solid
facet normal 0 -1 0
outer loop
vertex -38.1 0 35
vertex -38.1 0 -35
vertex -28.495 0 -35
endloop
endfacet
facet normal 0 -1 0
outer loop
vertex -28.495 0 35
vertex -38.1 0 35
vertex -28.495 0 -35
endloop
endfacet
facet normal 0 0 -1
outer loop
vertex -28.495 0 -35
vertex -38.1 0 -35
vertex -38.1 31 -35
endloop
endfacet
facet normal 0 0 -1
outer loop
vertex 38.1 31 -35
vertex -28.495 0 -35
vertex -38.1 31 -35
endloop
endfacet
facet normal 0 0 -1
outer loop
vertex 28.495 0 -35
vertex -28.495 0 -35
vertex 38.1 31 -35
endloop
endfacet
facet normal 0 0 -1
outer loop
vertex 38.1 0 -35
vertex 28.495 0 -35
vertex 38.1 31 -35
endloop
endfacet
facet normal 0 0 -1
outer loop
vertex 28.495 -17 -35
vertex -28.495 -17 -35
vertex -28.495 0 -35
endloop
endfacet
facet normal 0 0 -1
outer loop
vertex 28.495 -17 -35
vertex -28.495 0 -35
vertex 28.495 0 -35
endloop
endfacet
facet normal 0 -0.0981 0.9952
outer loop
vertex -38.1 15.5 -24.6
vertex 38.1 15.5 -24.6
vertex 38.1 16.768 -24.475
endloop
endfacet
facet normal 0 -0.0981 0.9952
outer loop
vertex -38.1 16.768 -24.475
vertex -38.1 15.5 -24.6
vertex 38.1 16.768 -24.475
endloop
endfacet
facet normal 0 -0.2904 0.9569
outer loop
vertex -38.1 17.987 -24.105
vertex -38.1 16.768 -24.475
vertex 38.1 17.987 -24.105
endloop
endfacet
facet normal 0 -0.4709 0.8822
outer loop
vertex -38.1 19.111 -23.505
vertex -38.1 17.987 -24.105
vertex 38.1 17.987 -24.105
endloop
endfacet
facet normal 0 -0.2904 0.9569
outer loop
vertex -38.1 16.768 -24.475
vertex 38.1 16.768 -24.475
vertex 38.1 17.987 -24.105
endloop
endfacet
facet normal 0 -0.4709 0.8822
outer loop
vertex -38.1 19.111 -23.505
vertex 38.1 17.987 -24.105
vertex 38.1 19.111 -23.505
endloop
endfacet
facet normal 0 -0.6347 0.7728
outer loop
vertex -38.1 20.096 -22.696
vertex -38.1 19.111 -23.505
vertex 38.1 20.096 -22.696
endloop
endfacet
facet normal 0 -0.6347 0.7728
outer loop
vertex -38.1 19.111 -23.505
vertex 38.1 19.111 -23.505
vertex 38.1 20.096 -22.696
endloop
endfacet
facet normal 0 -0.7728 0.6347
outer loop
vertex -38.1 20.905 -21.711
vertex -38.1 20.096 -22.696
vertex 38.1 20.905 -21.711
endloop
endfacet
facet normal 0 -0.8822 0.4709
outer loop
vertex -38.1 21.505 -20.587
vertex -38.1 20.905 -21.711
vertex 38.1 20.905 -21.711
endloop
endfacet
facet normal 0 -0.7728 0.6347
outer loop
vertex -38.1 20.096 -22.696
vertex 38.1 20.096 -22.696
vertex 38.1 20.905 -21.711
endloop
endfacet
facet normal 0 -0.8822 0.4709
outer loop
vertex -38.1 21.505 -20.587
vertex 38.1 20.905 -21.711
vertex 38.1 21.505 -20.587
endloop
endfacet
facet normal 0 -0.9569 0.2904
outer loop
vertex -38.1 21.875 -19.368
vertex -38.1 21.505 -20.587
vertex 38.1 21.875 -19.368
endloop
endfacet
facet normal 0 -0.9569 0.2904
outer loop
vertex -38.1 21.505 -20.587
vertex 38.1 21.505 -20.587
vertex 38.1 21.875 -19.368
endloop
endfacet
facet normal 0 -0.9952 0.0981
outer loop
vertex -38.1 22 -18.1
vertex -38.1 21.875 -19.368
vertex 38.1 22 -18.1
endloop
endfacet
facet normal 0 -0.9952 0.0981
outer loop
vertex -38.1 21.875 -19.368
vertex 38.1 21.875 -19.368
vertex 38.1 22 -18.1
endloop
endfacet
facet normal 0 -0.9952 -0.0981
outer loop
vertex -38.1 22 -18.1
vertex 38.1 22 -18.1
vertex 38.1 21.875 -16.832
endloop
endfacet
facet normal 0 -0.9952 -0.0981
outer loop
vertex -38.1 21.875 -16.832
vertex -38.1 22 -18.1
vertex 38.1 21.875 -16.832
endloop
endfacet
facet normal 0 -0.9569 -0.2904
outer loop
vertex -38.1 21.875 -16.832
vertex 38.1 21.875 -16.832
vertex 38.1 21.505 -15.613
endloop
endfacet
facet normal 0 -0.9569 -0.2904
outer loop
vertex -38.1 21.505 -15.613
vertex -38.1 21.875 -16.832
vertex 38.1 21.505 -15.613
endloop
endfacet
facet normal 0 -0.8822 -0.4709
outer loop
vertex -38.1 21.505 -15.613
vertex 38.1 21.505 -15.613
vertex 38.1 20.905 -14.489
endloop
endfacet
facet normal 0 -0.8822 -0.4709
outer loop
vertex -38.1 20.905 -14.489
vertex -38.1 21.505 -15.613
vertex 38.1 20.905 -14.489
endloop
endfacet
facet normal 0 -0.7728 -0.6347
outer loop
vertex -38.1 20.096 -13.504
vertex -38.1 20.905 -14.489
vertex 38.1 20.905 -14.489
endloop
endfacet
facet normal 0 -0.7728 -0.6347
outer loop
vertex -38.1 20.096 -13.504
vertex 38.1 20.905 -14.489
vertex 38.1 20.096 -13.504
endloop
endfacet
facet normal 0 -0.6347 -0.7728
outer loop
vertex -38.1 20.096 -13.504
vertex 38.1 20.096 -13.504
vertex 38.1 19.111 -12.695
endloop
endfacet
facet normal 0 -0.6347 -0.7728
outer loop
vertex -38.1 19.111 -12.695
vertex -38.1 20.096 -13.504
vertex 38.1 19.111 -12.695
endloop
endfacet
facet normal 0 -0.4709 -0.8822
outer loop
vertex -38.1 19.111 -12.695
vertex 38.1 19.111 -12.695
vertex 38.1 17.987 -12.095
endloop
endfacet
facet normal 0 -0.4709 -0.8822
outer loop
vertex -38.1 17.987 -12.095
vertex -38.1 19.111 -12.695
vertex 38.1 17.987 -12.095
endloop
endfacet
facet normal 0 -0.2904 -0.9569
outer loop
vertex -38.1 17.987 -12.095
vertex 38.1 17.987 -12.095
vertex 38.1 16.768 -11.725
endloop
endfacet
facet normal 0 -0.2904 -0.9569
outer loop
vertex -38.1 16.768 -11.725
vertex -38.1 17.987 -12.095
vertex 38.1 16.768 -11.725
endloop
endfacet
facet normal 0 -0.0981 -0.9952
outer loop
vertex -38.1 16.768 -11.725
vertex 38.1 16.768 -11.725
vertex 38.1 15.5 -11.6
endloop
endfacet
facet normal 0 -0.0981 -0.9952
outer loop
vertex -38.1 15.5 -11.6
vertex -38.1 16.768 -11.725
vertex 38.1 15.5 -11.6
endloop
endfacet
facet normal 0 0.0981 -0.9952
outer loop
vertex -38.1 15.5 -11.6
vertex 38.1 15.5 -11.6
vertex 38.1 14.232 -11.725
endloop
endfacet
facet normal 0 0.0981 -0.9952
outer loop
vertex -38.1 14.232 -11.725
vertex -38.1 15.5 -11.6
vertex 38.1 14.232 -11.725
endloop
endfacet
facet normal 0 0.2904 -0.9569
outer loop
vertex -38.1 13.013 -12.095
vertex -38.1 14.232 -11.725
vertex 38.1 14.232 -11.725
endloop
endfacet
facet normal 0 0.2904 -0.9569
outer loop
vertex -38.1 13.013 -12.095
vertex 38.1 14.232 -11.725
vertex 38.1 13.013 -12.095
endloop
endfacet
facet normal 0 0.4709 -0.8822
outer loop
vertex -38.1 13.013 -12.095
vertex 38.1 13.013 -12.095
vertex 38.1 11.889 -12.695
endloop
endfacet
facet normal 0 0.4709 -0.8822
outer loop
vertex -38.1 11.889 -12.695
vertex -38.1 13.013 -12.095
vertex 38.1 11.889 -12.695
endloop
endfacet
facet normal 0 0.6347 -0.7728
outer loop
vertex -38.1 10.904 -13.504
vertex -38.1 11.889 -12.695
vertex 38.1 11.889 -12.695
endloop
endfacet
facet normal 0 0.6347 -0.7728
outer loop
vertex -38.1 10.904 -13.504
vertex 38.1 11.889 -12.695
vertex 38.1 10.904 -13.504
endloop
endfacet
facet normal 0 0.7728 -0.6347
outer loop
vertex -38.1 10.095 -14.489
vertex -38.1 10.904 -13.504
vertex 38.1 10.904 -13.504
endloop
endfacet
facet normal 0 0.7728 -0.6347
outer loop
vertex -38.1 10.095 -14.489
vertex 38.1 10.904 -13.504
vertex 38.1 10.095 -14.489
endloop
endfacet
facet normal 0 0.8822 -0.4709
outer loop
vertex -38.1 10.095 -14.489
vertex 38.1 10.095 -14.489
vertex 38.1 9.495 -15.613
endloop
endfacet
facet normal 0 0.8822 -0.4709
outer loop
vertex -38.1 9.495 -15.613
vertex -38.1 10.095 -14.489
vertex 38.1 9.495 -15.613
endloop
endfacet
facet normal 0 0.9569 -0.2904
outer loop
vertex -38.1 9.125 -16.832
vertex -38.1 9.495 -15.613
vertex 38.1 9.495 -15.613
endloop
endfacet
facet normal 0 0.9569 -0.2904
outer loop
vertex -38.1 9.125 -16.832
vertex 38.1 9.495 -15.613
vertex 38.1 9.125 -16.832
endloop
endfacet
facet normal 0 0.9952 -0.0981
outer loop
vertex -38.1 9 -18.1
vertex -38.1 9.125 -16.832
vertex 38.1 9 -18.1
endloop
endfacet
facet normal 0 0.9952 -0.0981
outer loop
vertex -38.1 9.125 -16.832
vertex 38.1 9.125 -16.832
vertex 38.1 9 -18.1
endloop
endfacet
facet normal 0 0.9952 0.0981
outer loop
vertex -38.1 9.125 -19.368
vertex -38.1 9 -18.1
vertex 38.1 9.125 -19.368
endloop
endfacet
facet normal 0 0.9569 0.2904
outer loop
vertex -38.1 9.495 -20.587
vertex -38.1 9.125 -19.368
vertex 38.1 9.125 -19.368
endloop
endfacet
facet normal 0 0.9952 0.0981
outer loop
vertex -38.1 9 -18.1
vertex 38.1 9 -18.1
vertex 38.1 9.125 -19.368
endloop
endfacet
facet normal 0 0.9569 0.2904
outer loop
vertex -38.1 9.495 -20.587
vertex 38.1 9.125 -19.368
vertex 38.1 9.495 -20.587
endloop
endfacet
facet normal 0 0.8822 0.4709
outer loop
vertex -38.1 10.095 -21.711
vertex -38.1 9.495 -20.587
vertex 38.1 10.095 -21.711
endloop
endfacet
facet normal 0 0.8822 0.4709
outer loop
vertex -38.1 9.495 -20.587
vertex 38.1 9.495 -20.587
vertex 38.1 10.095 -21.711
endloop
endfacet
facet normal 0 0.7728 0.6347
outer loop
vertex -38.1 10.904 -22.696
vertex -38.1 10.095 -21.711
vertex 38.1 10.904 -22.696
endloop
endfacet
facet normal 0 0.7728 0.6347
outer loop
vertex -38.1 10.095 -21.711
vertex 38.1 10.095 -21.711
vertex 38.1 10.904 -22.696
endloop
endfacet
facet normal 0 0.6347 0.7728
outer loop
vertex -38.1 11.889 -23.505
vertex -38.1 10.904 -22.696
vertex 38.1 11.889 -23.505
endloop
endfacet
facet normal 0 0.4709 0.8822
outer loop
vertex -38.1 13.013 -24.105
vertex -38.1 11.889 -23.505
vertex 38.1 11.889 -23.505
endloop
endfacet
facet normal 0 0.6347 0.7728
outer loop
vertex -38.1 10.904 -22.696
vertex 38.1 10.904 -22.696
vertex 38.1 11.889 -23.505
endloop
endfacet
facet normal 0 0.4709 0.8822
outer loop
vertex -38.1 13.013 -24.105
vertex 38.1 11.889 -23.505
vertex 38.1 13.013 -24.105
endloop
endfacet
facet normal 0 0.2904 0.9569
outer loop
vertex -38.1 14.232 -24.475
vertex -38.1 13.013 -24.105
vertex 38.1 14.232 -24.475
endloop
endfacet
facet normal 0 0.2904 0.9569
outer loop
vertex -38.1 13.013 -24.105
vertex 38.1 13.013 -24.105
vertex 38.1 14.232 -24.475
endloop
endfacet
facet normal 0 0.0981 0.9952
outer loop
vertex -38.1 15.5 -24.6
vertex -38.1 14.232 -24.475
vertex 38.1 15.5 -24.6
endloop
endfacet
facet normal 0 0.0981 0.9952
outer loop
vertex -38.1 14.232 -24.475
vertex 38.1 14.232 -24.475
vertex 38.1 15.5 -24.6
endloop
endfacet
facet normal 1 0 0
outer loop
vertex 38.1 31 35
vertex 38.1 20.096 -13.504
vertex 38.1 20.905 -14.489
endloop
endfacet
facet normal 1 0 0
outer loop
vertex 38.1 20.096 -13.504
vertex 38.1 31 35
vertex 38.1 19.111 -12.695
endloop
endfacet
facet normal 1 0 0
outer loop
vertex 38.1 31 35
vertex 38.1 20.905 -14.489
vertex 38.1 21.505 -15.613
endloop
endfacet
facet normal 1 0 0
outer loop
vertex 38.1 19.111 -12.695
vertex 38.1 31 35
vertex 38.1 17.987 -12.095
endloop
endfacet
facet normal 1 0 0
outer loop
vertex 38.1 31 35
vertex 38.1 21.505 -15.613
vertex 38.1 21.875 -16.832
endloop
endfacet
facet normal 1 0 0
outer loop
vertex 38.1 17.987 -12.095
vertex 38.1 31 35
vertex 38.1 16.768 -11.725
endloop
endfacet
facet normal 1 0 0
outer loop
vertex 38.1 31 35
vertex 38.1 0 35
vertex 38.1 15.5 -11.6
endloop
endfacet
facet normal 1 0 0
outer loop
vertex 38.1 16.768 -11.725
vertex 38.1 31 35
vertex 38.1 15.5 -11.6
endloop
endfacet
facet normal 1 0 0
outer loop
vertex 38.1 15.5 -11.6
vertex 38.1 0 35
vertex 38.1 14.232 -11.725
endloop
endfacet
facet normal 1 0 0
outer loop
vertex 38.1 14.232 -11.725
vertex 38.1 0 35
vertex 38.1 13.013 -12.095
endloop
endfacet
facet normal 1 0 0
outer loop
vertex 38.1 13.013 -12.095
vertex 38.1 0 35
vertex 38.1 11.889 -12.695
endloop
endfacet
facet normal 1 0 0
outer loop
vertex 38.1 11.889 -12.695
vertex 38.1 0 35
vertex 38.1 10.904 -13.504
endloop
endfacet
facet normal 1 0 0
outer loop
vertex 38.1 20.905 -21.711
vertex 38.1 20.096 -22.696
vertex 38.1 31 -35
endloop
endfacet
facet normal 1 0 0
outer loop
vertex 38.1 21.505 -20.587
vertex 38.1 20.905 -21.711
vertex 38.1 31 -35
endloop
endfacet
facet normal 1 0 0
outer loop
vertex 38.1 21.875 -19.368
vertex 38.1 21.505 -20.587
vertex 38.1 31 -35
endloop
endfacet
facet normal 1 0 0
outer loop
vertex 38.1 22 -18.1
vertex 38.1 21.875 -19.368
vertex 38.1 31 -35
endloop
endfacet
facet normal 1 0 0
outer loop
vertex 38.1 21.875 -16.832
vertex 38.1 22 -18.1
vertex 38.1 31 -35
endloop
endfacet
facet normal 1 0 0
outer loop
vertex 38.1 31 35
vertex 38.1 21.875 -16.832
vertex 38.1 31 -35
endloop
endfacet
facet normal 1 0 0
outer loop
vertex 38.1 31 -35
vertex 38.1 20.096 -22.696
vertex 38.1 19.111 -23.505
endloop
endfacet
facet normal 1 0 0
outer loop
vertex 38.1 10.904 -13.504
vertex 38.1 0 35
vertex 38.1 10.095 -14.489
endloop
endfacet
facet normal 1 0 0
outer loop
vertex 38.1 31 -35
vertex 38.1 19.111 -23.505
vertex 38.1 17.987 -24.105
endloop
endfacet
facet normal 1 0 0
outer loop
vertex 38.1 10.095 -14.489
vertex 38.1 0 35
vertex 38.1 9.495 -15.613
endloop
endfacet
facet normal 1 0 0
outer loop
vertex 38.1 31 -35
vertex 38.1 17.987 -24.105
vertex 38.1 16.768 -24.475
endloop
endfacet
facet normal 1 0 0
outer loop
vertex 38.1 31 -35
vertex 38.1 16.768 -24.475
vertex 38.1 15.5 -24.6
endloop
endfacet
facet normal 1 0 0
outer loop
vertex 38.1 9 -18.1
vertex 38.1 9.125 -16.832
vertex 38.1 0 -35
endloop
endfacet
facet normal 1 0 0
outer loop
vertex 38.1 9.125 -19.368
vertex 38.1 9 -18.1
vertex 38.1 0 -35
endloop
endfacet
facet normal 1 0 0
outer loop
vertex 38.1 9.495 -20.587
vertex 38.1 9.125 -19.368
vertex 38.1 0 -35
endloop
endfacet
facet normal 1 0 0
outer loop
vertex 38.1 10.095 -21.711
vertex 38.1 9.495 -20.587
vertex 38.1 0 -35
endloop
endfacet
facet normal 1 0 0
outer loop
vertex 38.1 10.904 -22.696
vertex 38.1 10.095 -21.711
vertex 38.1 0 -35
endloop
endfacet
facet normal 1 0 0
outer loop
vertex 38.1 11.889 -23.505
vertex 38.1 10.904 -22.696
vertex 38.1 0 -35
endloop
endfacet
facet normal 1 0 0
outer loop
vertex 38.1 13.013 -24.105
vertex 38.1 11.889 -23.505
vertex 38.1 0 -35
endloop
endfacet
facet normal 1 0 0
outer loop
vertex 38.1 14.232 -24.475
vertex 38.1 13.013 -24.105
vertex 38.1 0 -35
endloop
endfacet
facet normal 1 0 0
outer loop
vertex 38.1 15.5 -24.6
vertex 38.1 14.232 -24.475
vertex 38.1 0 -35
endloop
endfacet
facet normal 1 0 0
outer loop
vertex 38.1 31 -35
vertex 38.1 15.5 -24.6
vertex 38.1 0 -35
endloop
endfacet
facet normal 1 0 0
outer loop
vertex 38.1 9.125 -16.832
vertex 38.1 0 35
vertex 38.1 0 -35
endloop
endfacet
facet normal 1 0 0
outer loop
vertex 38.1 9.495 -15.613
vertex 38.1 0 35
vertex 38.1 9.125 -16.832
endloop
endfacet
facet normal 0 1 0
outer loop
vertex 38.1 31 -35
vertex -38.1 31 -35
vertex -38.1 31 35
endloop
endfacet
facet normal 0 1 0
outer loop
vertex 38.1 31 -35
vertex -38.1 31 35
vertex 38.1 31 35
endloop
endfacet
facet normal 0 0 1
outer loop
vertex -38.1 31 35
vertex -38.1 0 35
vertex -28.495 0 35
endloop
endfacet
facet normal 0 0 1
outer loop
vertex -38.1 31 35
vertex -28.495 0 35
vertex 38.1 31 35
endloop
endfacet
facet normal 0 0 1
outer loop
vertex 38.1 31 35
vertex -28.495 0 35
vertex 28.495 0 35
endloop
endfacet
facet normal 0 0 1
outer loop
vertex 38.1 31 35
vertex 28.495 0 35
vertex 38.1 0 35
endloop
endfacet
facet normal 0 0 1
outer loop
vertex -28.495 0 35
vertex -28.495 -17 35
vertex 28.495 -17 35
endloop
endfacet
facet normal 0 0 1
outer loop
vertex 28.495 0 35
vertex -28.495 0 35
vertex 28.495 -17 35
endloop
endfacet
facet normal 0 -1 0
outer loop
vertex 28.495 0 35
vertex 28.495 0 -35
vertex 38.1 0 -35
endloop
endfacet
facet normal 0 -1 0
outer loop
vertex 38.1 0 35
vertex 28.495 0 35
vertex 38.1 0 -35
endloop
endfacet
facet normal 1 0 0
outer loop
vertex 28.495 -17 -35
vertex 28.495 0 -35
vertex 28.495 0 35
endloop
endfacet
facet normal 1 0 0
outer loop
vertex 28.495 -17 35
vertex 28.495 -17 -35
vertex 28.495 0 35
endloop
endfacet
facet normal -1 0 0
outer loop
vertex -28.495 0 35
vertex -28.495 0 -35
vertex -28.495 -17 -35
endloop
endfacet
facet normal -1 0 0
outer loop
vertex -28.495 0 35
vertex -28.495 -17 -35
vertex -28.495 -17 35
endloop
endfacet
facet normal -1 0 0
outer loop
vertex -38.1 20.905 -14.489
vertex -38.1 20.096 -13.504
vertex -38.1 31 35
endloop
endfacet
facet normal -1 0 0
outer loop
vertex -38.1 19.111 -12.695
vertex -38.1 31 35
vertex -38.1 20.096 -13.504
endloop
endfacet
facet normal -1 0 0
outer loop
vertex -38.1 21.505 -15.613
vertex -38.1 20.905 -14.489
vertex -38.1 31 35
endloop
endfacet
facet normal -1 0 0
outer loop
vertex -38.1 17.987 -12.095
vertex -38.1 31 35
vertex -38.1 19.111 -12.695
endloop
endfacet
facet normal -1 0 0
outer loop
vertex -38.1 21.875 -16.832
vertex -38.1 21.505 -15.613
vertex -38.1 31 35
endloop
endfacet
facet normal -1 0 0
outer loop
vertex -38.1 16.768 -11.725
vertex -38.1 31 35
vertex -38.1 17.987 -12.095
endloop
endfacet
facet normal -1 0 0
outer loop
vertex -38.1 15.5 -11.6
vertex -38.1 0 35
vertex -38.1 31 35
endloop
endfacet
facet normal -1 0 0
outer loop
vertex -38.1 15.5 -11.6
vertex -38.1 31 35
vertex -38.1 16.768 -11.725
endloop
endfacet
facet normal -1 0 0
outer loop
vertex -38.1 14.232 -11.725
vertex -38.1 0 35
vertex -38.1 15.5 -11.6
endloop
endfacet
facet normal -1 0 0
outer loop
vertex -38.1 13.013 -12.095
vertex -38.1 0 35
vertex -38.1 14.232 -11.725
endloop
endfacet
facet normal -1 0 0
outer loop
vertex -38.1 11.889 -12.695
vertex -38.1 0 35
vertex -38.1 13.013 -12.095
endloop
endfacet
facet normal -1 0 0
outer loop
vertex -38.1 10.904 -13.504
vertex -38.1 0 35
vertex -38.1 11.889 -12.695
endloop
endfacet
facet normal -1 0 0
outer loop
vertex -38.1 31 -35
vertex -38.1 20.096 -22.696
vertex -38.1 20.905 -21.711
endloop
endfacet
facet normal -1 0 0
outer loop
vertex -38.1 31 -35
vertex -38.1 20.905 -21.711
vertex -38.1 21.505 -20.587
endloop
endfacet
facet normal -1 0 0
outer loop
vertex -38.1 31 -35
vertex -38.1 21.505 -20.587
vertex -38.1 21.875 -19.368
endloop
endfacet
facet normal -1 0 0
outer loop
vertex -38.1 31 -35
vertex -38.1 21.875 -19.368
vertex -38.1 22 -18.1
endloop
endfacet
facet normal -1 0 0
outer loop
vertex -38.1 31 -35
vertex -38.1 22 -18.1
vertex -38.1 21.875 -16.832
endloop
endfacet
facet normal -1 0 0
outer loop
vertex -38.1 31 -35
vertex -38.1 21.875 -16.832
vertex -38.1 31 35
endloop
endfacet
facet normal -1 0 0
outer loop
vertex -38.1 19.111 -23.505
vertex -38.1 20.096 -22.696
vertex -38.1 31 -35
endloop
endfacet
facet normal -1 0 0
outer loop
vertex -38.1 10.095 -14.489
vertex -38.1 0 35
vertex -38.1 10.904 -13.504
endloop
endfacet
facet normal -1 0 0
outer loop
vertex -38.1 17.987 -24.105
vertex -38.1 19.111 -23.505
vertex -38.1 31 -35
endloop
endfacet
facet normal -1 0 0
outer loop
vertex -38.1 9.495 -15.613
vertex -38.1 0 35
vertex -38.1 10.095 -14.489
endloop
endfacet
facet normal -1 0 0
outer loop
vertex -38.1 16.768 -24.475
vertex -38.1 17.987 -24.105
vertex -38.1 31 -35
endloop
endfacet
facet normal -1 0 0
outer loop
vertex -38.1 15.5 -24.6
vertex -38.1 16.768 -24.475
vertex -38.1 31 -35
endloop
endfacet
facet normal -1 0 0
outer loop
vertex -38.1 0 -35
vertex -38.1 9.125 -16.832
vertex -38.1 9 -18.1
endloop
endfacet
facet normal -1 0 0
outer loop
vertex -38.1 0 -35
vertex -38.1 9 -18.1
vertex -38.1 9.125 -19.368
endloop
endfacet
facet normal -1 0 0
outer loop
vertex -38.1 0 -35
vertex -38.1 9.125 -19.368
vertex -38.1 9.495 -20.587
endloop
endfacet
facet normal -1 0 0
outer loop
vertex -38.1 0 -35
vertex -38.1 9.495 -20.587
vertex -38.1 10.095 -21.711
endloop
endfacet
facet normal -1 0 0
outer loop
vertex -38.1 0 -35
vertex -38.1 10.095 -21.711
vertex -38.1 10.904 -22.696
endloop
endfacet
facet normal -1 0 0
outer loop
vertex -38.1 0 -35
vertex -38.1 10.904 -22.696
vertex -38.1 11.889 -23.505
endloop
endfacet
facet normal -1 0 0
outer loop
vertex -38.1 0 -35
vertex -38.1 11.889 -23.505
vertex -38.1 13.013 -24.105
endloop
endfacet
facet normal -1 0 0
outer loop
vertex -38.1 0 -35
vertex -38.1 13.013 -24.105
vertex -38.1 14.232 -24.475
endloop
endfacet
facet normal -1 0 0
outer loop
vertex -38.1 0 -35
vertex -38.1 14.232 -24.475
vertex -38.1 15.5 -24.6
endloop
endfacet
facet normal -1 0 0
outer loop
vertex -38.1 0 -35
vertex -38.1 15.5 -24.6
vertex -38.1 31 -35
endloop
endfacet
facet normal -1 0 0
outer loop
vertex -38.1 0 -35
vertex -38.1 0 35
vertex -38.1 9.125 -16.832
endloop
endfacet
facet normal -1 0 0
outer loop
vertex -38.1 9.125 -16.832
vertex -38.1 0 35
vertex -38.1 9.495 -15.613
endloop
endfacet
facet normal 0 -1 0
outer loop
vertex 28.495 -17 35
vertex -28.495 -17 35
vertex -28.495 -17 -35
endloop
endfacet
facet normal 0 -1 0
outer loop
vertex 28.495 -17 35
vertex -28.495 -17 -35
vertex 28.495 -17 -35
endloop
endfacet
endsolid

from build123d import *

# Parameters (mm, degrees)
SKETCH1_W           = 76.2
SKETCH1_H           = 70
BOSS_EXTRUDE1_DEPTH = 31
SKETCH2_R           = 6.5
CUT_EXTRUDE1_DEPTH  = 90.400447426
SKETCH4_W           = 56.989038302
SKETCH4_H           = 70
BOSS_EXTRUDE2_DEPTH = 17


with BuildPart() as part:
    # Sketch1 → Boss-Extrude1 (new body)
    with BuildSketch(Plane(origin=(0, 0, 0), x_dir=(1, 0, 0), z_dir=(0, 1, 0))):
        Rectangle(SKETCH1_W, SKETCH1_H)
    extrude(amount=BOSS_EXTRUDE1_DEPTH)

    # Sketch2 → Cut-Extrude1 (cut, through all)
    with BuildSketch(Plane(origin=(38.1, 0, 0), x_dir=(0, 0, -1), z_dir=(1, 0, 0))):
        with Locations((18.1, 15.5)):
            Circle(SKETCH2_R)
    extrude(amount=-CUT_EXTRUDE1_DEPTH, mode=Mode.SUBTRACT)

    # Sketch4 → Boss-Extrude2 (add)
    with BuildSketch(Plane.XZ):
        Rectangle(SKETCH4_W, SKETCH4_H)
    extrude(amount=BOSS_EXTRUDE2_DEPTH)


solid = part.part
